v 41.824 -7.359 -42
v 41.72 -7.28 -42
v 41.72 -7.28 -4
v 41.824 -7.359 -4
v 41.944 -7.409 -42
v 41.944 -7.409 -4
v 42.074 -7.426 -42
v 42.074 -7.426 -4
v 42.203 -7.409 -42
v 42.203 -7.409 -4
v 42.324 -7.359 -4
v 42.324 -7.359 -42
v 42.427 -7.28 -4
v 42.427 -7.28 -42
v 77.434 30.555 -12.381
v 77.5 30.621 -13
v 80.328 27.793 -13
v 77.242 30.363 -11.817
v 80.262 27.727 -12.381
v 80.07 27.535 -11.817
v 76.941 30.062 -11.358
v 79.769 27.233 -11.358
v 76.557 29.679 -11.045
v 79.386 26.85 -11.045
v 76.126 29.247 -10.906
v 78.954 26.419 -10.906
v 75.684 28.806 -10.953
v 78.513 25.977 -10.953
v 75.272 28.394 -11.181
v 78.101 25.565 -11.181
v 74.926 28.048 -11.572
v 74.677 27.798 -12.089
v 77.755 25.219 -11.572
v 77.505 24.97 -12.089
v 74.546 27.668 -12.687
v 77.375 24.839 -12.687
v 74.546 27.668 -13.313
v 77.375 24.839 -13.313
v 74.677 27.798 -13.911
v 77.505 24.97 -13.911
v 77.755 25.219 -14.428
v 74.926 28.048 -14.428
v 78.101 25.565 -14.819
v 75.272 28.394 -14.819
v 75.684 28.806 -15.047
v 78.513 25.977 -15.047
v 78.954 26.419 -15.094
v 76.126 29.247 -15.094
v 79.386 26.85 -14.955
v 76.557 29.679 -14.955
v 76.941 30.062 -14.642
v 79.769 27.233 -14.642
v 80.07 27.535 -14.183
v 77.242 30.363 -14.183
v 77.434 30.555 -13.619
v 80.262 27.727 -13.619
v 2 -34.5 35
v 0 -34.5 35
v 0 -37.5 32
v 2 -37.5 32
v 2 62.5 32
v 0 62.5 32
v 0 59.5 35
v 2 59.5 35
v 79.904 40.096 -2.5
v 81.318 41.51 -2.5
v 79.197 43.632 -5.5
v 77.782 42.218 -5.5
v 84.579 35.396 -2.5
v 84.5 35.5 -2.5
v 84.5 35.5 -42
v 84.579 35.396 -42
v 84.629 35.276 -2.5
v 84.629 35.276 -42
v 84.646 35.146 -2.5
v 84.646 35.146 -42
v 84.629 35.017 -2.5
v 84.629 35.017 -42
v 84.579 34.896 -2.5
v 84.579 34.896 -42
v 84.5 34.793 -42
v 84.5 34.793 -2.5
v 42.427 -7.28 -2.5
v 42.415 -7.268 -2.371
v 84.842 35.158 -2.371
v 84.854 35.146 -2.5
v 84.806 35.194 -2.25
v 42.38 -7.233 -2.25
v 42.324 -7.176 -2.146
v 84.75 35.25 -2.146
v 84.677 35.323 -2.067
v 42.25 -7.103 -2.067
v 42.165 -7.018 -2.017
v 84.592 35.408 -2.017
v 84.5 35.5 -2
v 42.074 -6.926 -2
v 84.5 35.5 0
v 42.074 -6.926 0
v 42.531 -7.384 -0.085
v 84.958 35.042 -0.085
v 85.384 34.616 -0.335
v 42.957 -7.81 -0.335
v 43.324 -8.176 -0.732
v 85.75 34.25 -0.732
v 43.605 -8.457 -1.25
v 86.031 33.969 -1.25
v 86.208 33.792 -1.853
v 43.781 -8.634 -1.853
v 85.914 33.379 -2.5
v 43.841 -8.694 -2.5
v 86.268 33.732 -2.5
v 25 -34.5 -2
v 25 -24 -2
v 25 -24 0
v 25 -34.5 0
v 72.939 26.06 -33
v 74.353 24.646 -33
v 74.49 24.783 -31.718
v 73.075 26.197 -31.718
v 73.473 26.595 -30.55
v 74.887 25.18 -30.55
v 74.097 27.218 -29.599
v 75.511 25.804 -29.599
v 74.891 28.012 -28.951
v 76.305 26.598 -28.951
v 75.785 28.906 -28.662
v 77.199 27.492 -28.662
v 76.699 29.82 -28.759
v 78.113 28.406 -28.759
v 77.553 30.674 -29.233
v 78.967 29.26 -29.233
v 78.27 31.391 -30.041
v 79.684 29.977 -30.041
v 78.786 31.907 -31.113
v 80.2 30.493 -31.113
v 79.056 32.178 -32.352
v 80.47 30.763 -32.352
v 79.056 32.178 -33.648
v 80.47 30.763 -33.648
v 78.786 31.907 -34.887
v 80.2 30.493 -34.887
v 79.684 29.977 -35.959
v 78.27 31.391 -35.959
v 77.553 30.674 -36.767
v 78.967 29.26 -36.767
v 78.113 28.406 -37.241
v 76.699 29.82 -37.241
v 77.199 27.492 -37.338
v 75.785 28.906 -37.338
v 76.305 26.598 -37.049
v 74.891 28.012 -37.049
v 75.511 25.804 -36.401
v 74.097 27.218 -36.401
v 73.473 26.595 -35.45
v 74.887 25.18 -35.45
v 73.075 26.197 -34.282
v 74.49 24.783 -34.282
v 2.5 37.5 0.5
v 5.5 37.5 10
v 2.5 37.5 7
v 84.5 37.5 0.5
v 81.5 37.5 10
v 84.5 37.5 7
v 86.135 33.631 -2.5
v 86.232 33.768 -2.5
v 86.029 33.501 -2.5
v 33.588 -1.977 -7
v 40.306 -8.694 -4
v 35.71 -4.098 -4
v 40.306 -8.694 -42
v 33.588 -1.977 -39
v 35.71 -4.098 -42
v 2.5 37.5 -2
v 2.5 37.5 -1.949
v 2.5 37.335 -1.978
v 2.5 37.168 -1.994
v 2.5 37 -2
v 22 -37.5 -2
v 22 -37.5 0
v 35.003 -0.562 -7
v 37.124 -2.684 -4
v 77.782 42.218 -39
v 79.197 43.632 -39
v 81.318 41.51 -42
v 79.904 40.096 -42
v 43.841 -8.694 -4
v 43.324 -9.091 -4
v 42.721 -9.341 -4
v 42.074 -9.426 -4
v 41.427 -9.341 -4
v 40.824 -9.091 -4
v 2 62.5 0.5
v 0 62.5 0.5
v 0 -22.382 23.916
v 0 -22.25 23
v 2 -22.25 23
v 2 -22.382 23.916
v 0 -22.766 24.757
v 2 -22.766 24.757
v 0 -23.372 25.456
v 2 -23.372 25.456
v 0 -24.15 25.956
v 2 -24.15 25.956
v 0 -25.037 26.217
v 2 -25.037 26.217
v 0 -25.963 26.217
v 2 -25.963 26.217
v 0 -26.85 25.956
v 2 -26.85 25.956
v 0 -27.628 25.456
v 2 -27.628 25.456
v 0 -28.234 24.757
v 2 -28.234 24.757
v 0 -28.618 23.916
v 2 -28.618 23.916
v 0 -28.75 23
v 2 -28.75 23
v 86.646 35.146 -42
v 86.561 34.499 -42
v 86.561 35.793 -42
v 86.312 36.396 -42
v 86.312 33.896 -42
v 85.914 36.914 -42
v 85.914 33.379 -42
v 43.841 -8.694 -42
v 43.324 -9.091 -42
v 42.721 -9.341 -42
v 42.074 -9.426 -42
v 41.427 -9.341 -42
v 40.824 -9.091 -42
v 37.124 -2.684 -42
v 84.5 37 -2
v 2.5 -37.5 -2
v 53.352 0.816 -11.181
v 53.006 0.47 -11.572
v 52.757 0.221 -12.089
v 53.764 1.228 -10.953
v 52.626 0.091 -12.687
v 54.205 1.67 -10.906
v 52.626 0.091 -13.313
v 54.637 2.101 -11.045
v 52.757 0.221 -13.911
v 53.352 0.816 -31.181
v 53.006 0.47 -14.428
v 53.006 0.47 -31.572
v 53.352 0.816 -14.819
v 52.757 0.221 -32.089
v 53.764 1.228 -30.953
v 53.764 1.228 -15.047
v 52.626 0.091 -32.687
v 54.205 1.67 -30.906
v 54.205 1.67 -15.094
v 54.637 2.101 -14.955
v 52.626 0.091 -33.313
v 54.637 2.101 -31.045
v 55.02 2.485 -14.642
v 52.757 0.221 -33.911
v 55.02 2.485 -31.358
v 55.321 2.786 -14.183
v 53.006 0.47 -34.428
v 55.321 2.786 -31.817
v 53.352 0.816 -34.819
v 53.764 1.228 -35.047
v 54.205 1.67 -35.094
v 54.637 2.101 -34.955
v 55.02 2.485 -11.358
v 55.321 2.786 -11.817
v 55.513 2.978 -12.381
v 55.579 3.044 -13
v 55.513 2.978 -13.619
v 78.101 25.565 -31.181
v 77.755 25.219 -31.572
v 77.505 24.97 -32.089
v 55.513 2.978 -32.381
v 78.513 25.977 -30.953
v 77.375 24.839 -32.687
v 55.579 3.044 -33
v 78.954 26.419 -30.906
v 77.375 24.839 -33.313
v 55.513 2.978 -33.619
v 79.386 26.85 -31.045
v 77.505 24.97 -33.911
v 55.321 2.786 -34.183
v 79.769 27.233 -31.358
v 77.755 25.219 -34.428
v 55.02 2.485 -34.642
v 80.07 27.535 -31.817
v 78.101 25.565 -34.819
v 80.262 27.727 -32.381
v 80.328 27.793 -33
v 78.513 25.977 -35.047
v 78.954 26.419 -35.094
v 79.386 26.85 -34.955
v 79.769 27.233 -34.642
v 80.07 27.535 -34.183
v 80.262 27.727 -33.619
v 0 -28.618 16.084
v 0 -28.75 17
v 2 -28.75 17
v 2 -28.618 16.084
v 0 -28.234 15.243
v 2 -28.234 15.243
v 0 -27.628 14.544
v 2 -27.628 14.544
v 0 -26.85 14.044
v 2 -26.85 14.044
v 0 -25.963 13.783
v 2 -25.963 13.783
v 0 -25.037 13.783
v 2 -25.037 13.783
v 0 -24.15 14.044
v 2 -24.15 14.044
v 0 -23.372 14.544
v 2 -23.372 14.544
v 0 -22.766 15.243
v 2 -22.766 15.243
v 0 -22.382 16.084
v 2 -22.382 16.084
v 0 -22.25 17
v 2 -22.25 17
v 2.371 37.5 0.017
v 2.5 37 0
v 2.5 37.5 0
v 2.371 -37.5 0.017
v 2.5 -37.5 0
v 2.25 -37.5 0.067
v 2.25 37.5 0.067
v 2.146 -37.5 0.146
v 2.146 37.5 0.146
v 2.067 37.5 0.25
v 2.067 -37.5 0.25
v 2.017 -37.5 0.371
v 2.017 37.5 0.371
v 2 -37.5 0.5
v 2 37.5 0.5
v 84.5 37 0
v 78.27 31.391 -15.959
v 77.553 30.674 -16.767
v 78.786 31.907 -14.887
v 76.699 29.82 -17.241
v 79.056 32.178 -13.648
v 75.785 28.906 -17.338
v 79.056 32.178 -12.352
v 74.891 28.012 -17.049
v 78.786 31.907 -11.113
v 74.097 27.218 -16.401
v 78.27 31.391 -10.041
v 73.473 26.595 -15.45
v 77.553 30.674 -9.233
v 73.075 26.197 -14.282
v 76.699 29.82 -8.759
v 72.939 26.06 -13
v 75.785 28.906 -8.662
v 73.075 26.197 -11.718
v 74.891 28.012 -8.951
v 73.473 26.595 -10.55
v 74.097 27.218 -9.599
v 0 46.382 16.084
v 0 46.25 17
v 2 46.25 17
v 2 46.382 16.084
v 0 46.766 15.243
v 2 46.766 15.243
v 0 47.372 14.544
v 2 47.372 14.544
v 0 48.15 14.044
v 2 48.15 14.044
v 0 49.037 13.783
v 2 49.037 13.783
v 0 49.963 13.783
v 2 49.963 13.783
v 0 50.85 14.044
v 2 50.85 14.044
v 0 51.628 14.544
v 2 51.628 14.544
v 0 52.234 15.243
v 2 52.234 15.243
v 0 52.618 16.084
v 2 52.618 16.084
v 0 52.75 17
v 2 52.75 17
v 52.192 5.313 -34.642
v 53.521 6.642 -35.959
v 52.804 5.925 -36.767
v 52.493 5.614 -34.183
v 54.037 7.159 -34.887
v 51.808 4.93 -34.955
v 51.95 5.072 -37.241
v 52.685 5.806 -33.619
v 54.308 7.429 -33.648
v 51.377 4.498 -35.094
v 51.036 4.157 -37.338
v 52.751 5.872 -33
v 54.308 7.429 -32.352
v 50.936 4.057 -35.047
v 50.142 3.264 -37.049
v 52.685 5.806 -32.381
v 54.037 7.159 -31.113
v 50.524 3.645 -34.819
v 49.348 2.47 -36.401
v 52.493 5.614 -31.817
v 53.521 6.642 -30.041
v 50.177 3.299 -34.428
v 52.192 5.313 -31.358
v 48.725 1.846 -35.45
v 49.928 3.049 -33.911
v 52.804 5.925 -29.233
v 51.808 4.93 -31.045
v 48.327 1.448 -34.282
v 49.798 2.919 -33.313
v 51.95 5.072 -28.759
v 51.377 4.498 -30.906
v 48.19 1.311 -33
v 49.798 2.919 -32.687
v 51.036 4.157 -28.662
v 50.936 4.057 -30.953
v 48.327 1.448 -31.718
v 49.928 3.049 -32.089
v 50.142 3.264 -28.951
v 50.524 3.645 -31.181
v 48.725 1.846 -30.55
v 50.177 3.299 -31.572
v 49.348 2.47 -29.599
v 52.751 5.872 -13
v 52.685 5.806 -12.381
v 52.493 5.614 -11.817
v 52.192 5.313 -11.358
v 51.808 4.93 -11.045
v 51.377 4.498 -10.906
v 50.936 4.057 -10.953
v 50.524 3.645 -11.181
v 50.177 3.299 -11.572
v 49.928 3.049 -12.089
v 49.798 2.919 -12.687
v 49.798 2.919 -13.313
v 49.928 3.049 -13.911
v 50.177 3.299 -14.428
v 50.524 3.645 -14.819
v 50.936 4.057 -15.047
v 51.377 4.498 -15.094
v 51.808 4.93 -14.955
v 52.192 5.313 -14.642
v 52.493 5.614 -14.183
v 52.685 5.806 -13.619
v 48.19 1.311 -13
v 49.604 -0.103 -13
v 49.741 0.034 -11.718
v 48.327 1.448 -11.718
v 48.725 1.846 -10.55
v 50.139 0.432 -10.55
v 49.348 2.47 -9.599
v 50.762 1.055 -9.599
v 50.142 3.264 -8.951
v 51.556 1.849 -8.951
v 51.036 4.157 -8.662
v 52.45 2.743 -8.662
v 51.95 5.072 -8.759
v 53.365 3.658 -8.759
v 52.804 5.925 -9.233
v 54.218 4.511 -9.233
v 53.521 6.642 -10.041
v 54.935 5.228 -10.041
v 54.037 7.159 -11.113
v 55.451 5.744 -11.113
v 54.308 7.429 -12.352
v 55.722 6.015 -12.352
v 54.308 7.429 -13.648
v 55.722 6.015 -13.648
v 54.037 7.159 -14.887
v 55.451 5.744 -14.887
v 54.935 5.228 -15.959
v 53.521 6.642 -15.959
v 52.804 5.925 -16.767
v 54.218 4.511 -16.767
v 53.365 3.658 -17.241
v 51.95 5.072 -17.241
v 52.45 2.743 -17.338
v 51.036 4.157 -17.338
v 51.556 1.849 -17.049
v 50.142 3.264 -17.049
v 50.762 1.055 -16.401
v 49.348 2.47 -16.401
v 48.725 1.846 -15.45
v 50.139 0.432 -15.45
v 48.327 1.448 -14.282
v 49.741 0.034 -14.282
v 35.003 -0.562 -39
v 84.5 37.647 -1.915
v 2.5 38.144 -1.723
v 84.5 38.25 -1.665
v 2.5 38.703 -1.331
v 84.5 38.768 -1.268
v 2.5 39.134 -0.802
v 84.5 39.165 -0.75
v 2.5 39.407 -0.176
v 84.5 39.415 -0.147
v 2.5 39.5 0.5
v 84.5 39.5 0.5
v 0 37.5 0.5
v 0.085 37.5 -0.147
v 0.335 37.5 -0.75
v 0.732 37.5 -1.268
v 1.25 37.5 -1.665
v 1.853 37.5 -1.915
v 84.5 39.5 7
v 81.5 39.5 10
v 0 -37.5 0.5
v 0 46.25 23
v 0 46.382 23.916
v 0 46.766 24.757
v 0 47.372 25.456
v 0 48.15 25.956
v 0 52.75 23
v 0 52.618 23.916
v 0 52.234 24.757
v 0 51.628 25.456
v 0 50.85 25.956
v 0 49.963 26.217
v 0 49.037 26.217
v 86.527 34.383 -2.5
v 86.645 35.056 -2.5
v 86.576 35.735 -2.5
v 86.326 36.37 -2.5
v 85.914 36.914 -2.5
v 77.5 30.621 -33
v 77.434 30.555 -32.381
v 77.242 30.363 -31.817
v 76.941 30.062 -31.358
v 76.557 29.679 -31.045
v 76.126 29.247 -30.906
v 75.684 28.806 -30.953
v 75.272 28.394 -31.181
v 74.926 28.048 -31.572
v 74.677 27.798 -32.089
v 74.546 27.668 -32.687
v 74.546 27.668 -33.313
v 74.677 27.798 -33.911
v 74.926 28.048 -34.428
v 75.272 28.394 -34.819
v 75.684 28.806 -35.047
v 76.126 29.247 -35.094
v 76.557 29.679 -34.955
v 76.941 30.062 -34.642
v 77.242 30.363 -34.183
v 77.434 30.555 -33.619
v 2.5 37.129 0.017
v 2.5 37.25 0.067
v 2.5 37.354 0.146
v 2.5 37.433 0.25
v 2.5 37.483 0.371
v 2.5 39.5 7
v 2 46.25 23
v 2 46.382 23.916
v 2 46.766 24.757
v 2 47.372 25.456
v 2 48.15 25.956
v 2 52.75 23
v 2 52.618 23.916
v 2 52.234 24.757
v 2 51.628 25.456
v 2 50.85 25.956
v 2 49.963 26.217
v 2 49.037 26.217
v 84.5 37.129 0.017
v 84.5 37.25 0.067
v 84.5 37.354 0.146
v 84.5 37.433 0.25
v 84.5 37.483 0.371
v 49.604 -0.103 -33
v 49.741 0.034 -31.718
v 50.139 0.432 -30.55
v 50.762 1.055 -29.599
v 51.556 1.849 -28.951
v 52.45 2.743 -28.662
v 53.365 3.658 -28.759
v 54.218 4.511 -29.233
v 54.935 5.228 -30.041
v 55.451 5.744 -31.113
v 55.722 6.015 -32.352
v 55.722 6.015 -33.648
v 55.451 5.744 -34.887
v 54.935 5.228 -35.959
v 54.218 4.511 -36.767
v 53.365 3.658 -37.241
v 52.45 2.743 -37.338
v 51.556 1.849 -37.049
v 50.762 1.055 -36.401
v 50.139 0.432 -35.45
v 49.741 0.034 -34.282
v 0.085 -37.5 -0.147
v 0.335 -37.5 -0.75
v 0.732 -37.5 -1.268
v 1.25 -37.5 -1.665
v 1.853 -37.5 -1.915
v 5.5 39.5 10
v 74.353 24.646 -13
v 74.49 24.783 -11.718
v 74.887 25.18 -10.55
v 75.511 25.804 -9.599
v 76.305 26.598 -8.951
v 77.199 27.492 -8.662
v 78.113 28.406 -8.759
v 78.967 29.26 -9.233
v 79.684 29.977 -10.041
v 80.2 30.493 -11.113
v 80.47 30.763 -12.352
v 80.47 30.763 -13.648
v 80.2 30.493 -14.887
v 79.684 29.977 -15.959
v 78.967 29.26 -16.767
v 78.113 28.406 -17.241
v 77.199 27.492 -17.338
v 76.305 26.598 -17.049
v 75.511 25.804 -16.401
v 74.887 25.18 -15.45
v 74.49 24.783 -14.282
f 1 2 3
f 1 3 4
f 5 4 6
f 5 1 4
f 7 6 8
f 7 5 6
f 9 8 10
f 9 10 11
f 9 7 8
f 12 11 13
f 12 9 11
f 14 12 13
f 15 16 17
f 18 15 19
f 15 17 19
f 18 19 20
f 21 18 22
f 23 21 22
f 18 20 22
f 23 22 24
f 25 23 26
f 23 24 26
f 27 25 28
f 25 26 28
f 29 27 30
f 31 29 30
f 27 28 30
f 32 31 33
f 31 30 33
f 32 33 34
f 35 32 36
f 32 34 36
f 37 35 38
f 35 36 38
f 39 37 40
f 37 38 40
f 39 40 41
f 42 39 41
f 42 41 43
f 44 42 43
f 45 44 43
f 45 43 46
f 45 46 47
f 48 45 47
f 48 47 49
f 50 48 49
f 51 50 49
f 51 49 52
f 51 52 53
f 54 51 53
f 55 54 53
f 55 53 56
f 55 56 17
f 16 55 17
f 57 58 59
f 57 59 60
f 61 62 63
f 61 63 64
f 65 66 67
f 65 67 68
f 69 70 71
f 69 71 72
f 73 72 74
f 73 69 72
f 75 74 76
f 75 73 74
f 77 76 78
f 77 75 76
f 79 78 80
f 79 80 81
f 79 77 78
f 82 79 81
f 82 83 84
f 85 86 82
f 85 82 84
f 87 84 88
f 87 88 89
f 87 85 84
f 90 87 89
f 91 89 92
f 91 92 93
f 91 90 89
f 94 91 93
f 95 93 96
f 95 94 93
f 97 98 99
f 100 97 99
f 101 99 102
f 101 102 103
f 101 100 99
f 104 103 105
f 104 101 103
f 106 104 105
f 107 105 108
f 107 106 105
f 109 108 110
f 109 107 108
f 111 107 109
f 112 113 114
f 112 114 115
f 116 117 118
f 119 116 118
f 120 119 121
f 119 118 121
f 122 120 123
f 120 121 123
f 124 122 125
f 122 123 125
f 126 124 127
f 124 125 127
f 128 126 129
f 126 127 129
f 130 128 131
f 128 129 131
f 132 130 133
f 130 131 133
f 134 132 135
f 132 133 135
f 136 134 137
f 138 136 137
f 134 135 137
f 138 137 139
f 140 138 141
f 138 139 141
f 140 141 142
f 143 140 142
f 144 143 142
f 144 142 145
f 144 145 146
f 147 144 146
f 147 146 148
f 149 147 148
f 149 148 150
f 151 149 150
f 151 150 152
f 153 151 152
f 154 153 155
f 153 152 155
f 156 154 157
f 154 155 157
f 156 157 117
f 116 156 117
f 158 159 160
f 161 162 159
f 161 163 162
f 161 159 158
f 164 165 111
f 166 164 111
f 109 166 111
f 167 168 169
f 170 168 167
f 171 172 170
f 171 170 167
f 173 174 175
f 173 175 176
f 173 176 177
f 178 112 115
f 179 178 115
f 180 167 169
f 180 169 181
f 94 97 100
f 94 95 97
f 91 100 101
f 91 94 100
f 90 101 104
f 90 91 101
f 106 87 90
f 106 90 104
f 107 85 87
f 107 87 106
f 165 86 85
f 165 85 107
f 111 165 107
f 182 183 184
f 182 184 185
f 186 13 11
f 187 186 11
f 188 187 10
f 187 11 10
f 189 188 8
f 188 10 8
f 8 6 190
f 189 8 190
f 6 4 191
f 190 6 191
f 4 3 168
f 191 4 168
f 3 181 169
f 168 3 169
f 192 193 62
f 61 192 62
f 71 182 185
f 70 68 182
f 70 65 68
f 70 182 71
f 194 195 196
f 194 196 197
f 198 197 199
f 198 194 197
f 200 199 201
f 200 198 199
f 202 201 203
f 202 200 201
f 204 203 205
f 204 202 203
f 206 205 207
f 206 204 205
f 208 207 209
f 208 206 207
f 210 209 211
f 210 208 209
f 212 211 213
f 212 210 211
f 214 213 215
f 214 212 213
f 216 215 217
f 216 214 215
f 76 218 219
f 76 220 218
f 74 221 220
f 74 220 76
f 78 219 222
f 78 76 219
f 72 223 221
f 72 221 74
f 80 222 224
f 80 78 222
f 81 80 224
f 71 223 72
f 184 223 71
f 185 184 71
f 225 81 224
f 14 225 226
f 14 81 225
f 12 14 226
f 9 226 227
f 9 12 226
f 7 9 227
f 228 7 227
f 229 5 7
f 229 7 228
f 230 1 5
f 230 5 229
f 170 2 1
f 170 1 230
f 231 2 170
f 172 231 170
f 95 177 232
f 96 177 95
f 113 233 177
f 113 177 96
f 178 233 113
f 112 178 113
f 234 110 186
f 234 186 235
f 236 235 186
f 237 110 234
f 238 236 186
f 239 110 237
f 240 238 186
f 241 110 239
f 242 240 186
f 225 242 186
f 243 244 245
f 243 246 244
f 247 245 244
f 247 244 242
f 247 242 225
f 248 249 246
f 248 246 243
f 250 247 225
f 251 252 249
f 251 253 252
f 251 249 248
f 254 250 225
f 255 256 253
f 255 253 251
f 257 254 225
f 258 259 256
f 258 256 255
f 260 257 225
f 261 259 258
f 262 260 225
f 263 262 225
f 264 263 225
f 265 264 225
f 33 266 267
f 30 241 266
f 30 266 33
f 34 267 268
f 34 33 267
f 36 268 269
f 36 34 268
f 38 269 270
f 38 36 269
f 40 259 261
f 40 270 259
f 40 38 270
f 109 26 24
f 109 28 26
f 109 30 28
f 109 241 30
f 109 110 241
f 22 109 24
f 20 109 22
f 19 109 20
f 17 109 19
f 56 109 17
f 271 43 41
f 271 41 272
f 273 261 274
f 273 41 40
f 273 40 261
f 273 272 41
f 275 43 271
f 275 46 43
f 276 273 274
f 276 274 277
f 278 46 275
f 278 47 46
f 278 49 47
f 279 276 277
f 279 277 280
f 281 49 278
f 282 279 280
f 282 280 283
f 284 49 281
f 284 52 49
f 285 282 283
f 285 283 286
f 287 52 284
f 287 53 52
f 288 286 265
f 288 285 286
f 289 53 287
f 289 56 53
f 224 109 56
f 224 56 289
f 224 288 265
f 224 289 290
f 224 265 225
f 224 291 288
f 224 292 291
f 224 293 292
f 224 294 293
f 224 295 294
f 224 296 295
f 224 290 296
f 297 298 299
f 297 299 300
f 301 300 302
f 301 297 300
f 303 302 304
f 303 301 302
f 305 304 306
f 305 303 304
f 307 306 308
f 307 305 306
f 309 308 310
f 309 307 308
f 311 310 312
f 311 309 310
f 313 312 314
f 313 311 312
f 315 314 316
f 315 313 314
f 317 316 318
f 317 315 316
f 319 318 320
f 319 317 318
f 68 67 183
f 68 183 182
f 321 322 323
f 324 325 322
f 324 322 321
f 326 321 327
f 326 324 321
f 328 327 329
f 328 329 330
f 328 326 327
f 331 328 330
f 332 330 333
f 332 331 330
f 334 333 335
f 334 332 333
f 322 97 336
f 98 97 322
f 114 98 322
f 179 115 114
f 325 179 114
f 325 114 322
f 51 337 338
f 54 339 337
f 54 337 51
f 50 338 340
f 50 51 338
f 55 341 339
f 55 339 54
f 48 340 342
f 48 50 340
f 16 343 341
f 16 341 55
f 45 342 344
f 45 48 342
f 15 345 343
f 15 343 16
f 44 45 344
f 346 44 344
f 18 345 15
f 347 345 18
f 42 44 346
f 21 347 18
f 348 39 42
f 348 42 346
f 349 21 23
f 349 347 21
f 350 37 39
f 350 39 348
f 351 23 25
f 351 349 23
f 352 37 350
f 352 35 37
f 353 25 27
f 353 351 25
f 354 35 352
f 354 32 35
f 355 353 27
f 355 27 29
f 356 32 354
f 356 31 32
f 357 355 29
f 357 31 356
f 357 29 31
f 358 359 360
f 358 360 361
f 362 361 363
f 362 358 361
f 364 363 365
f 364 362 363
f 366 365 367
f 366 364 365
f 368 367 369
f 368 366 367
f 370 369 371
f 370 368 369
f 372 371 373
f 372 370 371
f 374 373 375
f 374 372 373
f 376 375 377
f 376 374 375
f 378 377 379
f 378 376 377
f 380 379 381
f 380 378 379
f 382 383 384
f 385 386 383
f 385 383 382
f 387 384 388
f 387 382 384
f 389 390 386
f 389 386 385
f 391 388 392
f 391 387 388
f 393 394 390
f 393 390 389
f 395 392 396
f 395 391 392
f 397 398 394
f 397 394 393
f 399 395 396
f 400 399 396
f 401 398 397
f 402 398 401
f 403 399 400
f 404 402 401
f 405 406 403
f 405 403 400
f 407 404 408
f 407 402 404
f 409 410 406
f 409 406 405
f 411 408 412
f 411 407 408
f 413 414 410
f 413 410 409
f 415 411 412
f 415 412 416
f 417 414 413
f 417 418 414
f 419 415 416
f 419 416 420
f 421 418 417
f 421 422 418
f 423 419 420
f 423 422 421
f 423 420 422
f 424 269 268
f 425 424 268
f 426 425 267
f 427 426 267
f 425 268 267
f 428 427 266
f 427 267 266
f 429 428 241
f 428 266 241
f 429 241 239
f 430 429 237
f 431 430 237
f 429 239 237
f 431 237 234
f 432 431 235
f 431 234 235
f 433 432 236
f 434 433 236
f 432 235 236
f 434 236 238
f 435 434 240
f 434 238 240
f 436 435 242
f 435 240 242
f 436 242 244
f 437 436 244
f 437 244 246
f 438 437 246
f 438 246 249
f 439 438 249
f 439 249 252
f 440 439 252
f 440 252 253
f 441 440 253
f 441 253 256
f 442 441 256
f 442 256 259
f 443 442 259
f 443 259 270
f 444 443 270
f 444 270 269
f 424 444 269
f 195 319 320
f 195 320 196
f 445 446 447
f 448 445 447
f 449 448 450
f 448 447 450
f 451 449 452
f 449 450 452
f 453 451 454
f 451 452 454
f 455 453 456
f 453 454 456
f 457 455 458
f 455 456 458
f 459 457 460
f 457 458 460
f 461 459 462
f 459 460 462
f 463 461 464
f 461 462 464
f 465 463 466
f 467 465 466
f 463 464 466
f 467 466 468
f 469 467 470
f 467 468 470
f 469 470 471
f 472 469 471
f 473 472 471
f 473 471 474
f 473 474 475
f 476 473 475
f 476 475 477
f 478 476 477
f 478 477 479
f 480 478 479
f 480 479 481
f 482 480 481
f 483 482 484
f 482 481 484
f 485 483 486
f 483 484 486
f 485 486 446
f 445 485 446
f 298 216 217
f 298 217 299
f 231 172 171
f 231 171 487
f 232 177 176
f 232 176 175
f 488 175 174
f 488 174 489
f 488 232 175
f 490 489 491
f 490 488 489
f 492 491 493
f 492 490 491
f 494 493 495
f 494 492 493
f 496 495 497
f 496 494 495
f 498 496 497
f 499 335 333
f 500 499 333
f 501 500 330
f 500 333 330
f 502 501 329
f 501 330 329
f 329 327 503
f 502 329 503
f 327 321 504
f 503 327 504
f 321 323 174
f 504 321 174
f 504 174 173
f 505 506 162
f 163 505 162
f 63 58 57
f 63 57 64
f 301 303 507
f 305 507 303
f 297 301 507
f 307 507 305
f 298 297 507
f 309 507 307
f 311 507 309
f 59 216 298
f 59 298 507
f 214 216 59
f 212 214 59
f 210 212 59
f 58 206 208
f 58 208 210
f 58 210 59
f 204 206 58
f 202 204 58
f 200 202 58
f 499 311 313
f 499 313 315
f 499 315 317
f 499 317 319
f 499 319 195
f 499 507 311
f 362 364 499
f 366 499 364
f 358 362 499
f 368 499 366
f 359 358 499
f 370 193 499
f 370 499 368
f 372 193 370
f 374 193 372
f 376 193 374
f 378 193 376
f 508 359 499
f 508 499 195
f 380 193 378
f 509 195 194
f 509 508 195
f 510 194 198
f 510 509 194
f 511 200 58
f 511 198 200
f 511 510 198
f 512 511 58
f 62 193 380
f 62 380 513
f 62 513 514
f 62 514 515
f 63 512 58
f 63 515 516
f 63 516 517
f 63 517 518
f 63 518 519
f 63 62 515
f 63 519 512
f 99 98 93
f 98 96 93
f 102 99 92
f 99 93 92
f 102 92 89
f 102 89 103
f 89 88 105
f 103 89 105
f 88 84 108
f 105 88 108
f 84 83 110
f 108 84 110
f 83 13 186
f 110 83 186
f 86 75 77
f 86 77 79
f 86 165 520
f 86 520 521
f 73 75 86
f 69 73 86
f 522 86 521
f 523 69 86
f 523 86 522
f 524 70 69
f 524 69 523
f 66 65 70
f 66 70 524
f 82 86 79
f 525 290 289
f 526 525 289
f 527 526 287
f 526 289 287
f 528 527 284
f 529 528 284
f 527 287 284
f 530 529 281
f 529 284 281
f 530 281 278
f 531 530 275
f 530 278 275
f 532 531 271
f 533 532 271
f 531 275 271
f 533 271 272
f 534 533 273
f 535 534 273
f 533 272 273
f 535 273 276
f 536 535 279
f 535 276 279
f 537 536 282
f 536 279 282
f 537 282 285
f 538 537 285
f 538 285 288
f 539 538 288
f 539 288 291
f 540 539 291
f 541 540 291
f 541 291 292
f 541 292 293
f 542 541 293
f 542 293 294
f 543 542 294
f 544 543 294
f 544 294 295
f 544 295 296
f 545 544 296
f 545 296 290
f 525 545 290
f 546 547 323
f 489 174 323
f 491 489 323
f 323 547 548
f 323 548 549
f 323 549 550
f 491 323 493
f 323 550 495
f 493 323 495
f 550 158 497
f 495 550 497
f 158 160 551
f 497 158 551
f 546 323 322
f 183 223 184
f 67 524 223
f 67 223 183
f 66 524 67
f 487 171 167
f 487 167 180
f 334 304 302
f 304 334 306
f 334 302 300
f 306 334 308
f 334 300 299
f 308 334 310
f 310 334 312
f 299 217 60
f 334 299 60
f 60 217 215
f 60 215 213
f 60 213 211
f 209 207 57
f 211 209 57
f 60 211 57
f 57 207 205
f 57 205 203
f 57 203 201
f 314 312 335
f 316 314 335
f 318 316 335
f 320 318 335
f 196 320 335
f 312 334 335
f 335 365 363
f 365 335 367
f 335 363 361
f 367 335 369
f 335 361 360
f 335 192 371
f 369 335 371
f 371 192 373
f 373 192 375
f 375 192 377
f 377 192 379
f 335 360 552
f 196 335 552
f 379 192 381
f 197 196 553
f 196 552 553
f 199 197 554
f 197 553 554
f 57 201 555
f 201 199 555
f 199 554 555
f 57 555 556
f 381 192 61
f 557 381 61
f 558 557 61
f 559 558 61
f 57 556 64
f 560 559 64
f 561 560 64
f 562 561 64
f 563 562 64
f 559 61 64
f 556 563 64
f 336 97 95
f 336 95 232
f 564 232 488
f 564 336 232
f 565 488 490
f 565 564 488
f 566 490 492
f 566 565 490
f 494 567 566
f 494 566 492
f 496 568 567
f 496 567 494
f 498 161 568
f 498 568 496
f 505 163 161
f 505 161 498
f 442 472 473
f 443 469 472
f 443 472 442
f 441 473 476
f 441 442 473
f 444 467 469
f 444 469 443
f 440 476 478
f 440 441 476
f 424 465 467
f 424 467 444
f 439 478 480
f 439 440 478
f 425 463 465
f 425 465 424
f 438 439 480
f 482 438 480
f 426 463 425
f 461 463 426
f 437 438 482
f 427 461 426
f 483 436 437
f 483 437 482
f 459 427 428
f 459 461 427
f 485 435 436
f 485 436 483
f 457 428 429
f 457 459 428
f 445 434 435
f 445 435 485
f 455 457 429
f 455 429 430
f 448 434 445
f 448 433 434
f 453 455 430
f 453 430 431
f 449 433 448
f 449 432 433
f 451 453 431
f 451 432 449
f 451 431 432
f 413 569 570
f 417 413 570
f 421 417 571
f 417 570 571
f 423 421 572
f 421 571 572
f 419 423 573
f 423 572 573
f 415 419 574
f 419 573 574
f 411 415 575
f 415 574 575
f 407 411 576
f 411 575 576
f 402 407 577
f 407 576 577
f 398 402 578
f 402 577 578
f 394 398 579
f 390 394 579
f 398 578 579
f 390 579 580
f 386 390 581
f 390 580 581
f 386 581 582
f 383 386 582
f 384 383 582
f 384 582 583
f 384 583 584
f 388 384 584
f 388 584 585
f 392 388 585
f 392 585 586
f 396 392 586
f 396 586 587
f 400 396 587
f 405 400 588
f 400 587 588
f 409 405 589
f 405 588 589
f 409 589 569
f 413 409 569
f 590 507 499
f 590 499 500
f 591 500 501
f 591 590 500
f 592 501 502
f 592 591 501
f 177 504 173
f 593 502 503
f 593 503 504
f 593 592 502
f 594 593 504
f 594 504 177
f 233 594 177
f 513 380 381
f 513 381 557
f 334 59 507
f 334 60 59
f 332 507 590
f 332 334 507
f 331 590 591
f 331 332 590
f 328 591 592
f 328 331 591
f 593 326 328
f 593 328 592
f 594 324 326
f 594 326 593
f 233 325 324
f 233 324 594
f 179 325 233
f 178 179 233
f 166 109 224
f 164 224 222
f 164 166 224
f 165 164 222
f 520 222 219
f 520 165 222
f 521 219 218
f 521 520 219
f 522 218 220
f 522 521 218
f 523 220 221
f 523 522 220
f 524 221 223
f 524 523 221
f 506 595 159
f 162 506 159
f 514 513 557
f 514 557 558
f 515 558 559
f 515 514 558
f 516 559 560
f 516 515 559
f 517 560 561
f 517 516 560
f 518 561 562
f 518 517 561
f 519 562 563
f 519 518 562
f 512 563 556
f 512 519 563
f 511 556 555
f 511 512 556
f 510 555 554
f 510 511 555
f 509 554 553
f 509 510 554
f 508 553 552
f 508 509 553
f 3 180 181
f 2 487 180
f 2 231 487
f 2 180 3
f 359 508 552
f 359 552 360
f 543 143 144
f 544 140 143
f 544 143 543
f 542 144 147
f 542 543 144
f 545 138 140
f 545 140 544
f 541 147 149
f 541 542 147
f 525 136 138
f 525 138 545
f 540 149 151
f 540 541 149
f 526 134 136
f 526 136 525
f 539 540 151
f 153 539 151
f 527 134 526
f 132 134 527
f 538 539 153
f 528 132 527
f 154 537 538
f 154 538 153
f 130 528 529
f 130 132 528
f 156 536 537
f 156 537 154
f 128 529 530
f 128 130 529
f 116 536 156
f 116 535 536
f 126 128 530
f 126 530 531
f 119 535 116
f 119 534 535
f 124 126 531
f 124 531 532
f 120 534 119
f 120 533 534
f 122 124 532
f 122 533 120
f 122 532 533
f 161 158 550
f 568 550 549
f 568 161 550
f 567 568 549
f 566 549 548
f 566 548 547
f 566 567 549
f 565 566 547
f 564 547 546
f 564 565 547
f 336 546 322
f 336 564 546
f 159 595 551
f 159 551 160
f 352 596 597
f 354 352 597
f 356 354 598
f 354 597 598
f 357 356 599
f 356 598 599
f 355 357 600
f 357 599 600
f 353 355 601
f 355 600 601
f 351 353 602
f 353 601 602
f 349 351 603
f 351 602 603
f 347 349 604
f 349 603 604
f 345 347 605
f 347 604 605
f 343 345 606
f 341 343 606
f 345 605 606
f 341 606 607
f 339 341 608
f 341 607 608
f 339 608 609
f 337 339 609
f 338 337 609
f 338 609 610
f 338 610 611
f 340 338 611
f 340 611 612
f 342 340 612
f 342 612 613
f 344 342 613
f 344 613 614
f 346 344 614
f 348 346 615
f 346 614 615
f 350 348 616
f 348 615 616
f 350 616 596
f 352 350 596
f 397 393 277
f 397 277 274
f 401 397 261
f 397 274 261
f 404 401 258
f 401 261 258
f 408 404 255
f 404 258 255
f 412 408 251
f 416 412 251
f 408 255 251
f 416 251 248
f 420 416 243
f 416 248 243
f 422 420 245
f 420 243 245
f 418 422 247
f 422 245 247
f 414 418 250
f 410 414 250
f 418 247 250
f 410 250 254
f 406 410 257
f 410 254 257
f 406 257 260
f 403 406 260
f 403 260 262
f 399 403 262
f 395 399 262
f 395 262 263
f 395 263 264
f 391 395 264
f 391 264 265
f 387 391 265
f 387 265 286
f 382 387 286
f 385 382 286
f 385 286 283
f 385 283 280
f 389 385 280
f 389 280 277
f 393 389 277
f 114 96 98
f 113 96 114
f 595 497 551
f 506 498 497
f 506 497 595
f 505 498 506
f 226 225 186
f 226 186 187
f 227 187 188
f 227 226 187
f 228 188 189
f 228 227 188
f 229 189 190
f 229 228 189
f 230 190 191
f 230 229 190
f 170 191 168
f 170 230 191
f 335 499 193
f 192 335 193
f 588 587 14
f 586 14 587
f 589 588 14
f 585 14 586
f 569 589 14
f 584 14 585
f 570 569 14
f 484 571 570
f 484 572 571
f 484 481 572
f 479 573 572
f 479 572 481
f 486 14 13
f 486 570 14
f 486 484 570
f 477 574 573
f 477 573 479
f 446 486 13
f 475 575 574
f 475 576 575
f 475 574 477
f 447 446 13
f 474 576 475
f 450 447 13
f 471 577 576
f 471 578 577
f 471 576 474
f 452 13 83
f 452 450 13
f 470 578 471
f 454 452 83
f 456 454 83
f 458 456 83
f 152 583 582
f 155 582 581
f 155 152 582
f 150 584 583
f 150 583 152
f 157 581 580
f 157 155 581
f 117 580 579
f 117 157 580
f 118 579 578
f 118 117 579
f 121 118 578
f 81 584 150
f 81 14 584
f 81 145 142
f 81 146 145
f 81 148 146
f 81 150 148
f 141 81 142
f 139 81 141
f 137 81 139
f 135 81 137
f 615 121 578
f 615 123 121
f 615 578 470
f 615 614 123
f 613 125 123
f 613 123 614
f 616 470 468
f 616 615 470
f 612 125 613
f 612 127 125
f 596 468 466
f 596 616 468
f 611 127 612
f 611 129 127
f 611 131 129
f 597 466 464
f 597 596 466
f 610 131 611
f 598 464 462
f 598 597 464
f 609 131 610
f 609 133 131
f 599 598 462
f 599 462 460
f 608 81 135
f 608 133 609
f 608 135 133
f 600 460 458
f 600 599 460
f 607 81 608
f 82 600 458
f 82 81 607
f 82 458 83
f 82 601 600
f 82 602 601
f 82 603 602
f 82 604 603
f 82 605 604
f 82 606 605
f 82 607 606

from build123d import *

# Parameters (mm, degrees)
SKETCH_1_W                       = 2
SKETCH_1_H                       = 75
SM_BASE_FLANGE_1_DEPTH           = 35
SM_EDGE_FLANGE_1_STRIP_W         = 9
SM_EDGE_FLANGE_1_STRIP_H         = 2
SM_EDGE_FLANGE_1_STRIP_CUT_DEPTH = 75
SM_EDGE_FLANGE_1_DEPTH           = 75
CUT_EXTRUDE_1_DEPTH              = 2
SM_EDGE_FLANGE_2_DEPTH           = 60
SM_EDGE_FLANGE_3_STRIP_W         = 9
SM_EDGE_FLANGE_3_STRIP_H         = 2
SM_EDGE_FLANGE_3_STRIP_CUT_DEPTH = 39.5
SM_EDGE_FLANGE_3_DEPTH           = 39.5
SM_EDGE_FLANGE_4_STRIP_W         = 9
SM_EDGE_FLANGE_4_STRIP_H         = 2
SM_EDGE_FLANGE_4_STRIP_CUT_DEPTH = 82
SM_EDGE_FLANGE_4_DEPTH           = 82
SM_EDGE_FLANGE_5_DEPTH           = 38
SKETCH_18_R                      = 4.35
EXTRUDE_1_DEPTH                  = 2
HOLE_WIZARD_M5_1_D               = 4.2
HOLE_WIZARD_M5_1_DEPTH           = 33.751449569
PATTERN_LINEAR_1_COUNT           = 2
PATTERN_LINEAR_1_PITCH           = 20
PATTERN_LINEAR_1_COUNT_DIR2      = 2
PATTERN_LINEAR_1_PITCH_DIR2      = 35
SKETCH_26_W                      = 34.5
SKETCH_26_H                      = 25
SM_BASE_FLANGE_1_2_DEPTH         = 2
CUT_EXTRUDE_2_DEPTH              = 2
CHAMFER_1_SIZE                   = 3


# Sheet-metal steps are written as plain solids
with BuildPart() as part:
    # Sketch 1 → Sm Base Flange 1 (new body)
    with BuildSketch(Plane.XY):
        with Locations((1, 0)):
            Rectangle(SKETCH_1_W, SKETCH_1_H)
    extrude(amount=SM_BASE_FLANGE_1_DEPTH)

    # 边线-法兰1 strip (across the edge) → 边线-法兰1 strip cut (cut)
    with BuildSketch(Plane(origin=(2, -37.5, 0), x_dir=(0, 0, 1), z_dir=(0, 1, 0))):
        with Locations((-4, -1)):
            Rectangle(SM_EDGE_FLANGE_1_STRIP_W, SM_EDGE_FLANGE_1_STRIP_H)
    extrude(amount=SM_EDGE_FLANGE_1_STRIP_CUT_DEPTH, mode=Mode.SUBTRACT)

    # 边线-法兰1 section (across the edge) → 边线-法兰1 (add)
    with BuildSketch(Plane(origin=(2, -37.5, 0), x_dir=(0, 0, 1), z_dir=(0, 1, 0))):
        with BuildLine():
            Line((-2, 0.5), (-2, 84))
            Line((-2, 84), (0, 84))
            Line((0, 84), (0, 0.5))
            ThreePointArc((0, 0.5), (0.146446609, 0.146446609), (0.5, 0))
            Line((0.5, 0), (0.5, -2))
            ThreePointArc((0.5, -2), (-1.267766953, -1.267766953), (-2, 0.5))
        make_face()
    extrude(amount=SM_EDGE_FLANGE_1_DEPTH)

    # 草图6 → 切除-拉伸1 (cut)
    with BuildSketch(Plane(origin=(0, 0, -2), x_dir=(-1, 0, 0), z_dir=(0, 0, -1))):
        Polygon((-84.5, 35.5), (-25, -24), (-25, -37.5), (-86, -37.5), (-86, 37.5), (-84.5, 37.5), align=None)
    extrude(amount=-CUT_EXTRUDE_1_DEPTH, mode=Mode.SUBTRACT)

    # 边线-法兰2 section (across the edge) → 边线-法兰2 (add)
    with BuildSketch(Plane(origin=(84.853553391, 35.146446609, -2), x_dir=(-0.7071067811865437, 0.7071067811865513, -1.0226318000689522e-15), z_dir=(-0.7071067811865513, -0.7071067811865437, 2.468731249046521e-15))):
        with BuildLine():
            Line((-2, 0.5), (-2, 40))
            Line((-2, 40), (0, 40))
            Line((0, 40), (0, 0.5))
            ThreePointArc((0, 0.5), (0.146446609, 0.146446609), (0.5, 0))
            Line((0.5, 0), (0.5, -2))
            ThreePointArc((0.5, -2), (-1.267766953, -1.267766953), (-2, 0.5))
        make_face()
    extrude(amount=SM_EDGE_FLANGE_2_DEPTH)

    # 边线-法兰3 strip (across the edge) → 边线-法兰3 strip cut (cut)
    with BuildSketch(Plane(origin=(84.853553391, 35.146446609, -2.5), x_dir=(-0.7071067811865538, -0.7071067811865412, 2.111674983989249e-15), z_dir=(0, 0, -1))):
        with Locations((-4, -1)):
            Rectangle(SM_EDGE_FLANGE_3_STRIP_W, SM_EDGE_FLANGE_3_STRIP_H)
    extrude(amount=SM_EDGE_FLANGE_3_STRIP_CUT_DEPTH, mode=Mode.SUBTRACT)

    # 边线-法兰3 section (across the edge) → 边线-法兰3 (add)
    with BuildSketch(Plane(origin=(84.853553391, 35.146446609, -2.5), x_dir=(-0.7071067811865538, -0.7071067811865412, 2.111674983989249e-15), z_dir=(0, 0, -1))):
        with BuildLine():
            Line((-2, 0.5), (-2, 10))
            Line((-2, 10), (0, 10))
            Line((0, 10), (0, 0.5))
            ThreePointArc((0, 0.5), (0.146446609, 0.146446609), (0.5, 0))
            Line((0.5, 0), (0.5, -2))
            ThreePointArc((0.5, -2), (-1.267766953, -1.267766953), (-2, 0.5))
        make_face()
    extrude(amount=SM_EDGE_FLANGE_3_DEPTH)

    # 边线-法兰4 strip (across the edge) → 边线-法兰4 strip cut (cut)
    with BuildSketch(Plane(origin=(84.5, 37.5, 0), x_dir=(0, -1, 0), z_dir=(-1, 0, 0))):
        with Locations((-4, -1)):
            Rectangle(SM_EDGE_FLANGE_4_STRIP_W, SM_EDGE_FLANGE_4_STRIP_H)
    extrude(amount=SM_EDGE_FLANGE_4_STRIP_CUT_DEPTH, mode=Mode.SUBTRACT)

    # 边线-法兰4 section (across the edge) → 边线-法兰4 (add)
    with BuildSketch(Plane(origin=(84.5, 37.5, 0), x_dir=(0, -1, 0), z_dir=(-1, 0, 0))):
        with BuildLine():
            Line((-2, 0.5), (-2, 10))
            Line((-2, 10), (0, 10))
            Line((0, 10), (0, 0.5))
            ThreePointArc((0, 0.5), (0.146446609, 0.146446609), (0.5, 0))
            Line((0.5, 0), (0.5, -2))
            ThreePointArc((0.5, -2), (-1.267766953, -1.267766953), (-2, 0.5))
        make_face()
    extrude(amount=SM_EDGE_FLANGE_4_DEPTH)

    # 边线-法兰5 section (across the edge) → 边线-法兰5 (add)
    with BuildSketch(Plane(origin=(42.073593129, -7.633513652, -42), x_dir=(0.7071067811865489, 0.7071067811865461, -2.23589115951803e-15), z_dir=(0, 0, 1))):
        with BuildLine():
            Line((-2, 0.5), (-2, 10))
            Line((-2, 10), (0, 10))
            Line((0, 10), (0, 0.5))
            ThreePointArc((0, 0.5), (0.146446609, 0.146446609), (0.5, 0))
            Line((0.5, 0), (0.5, -2))
            ThreePointArc((0.5, -2), (-1.267766953, -1.267766953), (-2, 0.5))
        make_face()
    extrude(amount=SM_EDGE_FLANGE_5_DEPTH)

    # 草图18 → 凸台-拉伸1 (add)
    with BuildSketch(Plane(origin=(24.853553391, -24.853553391, 0), x_dir=(0, 0, 1), z_dir=(-0.7071067811865436, 0.7071067811865515, -1.027306589177874e-15))):
        with Locations(Location((-33, 74.352813742, 0), (0, 0, 270))):
            Circle(SKETCH_18_R)
    extrude_1 = extrude(amount=EXTRUDE_1_DEPTH)

    # M5 螺纹孔1
    with Locations(Plane(origin=(23.439339828, -23.439339828, 0), x_dir=(-0.7071067811865515, -0.7071067811865436, 1.0273065891778625e-15), z_dir=(-0.7071067811865436, 0.7071067811865515, -1.027306589177874e-15))):
        with Locations((-74.352813742, -33)):
            hole_wizard_m5_1 = Hole(HOLE_WIZARD_M5_1_D / 2, depth=HOLE_WIZARD_M5_1_DEPTH)

    # 阵列(线性)1: 凸台-拉伸1, Hole Wizard M5 _1 2 × 2
    with Locations(*[Vector(0, 0, 1) * (i * PATTERN_LINEAR_1_PITCH) + Vector(-0.7071067811865475, -0.7071067811865477, 1.982541115402065e-15) * (j * PATTERN_LINEAR_1_PITCH_DIR2) for i in range(PATTERN_LINEAR_1_COUNT) for j in range(PATTERN_LINEAR_1_COUNT_DIR2) if (i, j) != (0, 0)]):
        add(extrude_1)
        add(hole_wizard_m5_1, mode=Mode.SUBTRACT)

    # 草图26 → Sm Base Flange 1 2 (add)
    with BuildSketch(Plane.ZY):
        with Locations((17.75, 50)):
            Rectangle(SKETCH_26_W, SKETCH_26_H)
    extrude(amount=-SM_BASE_FLANGE_1_2_DEPTH)

    # 草图16 → 切除-拉伸2 (cut)
    with BuildSketch(Plane.ZY):
        with BuildLine():
            Line((17, -22.25), (23, -22.25))
            ThreePointArc((23, -22.25), (26.25, -25.5), (23, -28.75))
            Line((23, -28.75), (17, -28.75))
            ThreePointArc((17, -28.75), (13.75, -25.5), (17, -22.25))
        make_face()
        with BuildLine():
            Line((17, 52.75), (23, 52.75))
            ThreePointArc((23, 52.75), (26.25, 49.5), (23, 46.25))
            Line((23, 46.25), (17, 46.25))
            ThreePointArc((17, 46.25), (13.75, 49.5), (17, 52.75))
        make_face()
    extrude(amount=-CUT_EXTRUDE_2_DEPTH, mode=Mode.SUBTRACT)

    # 倒角1
    chamfer_1_edges = [part.edges().sort_by_distance(p)[0] for p in [
        (78.48959236, 42.924621202, -2.5),
        (78.48959236, 42.924621202, -42),
        (84.5, 38.5, 10),
        (2.5, 38.5, 10),
        (34.295418536, -1.269552622, -42),
        (34.295418536, -1.269552622, -4),
        (1, 62.5, 35),
        (25, -37.5, -1),
        (1, -37.5, 35),
    ]]
    chamfer(chamfer_1_edges, length=CHAMFER_1_SIZE)


solid = part.part
